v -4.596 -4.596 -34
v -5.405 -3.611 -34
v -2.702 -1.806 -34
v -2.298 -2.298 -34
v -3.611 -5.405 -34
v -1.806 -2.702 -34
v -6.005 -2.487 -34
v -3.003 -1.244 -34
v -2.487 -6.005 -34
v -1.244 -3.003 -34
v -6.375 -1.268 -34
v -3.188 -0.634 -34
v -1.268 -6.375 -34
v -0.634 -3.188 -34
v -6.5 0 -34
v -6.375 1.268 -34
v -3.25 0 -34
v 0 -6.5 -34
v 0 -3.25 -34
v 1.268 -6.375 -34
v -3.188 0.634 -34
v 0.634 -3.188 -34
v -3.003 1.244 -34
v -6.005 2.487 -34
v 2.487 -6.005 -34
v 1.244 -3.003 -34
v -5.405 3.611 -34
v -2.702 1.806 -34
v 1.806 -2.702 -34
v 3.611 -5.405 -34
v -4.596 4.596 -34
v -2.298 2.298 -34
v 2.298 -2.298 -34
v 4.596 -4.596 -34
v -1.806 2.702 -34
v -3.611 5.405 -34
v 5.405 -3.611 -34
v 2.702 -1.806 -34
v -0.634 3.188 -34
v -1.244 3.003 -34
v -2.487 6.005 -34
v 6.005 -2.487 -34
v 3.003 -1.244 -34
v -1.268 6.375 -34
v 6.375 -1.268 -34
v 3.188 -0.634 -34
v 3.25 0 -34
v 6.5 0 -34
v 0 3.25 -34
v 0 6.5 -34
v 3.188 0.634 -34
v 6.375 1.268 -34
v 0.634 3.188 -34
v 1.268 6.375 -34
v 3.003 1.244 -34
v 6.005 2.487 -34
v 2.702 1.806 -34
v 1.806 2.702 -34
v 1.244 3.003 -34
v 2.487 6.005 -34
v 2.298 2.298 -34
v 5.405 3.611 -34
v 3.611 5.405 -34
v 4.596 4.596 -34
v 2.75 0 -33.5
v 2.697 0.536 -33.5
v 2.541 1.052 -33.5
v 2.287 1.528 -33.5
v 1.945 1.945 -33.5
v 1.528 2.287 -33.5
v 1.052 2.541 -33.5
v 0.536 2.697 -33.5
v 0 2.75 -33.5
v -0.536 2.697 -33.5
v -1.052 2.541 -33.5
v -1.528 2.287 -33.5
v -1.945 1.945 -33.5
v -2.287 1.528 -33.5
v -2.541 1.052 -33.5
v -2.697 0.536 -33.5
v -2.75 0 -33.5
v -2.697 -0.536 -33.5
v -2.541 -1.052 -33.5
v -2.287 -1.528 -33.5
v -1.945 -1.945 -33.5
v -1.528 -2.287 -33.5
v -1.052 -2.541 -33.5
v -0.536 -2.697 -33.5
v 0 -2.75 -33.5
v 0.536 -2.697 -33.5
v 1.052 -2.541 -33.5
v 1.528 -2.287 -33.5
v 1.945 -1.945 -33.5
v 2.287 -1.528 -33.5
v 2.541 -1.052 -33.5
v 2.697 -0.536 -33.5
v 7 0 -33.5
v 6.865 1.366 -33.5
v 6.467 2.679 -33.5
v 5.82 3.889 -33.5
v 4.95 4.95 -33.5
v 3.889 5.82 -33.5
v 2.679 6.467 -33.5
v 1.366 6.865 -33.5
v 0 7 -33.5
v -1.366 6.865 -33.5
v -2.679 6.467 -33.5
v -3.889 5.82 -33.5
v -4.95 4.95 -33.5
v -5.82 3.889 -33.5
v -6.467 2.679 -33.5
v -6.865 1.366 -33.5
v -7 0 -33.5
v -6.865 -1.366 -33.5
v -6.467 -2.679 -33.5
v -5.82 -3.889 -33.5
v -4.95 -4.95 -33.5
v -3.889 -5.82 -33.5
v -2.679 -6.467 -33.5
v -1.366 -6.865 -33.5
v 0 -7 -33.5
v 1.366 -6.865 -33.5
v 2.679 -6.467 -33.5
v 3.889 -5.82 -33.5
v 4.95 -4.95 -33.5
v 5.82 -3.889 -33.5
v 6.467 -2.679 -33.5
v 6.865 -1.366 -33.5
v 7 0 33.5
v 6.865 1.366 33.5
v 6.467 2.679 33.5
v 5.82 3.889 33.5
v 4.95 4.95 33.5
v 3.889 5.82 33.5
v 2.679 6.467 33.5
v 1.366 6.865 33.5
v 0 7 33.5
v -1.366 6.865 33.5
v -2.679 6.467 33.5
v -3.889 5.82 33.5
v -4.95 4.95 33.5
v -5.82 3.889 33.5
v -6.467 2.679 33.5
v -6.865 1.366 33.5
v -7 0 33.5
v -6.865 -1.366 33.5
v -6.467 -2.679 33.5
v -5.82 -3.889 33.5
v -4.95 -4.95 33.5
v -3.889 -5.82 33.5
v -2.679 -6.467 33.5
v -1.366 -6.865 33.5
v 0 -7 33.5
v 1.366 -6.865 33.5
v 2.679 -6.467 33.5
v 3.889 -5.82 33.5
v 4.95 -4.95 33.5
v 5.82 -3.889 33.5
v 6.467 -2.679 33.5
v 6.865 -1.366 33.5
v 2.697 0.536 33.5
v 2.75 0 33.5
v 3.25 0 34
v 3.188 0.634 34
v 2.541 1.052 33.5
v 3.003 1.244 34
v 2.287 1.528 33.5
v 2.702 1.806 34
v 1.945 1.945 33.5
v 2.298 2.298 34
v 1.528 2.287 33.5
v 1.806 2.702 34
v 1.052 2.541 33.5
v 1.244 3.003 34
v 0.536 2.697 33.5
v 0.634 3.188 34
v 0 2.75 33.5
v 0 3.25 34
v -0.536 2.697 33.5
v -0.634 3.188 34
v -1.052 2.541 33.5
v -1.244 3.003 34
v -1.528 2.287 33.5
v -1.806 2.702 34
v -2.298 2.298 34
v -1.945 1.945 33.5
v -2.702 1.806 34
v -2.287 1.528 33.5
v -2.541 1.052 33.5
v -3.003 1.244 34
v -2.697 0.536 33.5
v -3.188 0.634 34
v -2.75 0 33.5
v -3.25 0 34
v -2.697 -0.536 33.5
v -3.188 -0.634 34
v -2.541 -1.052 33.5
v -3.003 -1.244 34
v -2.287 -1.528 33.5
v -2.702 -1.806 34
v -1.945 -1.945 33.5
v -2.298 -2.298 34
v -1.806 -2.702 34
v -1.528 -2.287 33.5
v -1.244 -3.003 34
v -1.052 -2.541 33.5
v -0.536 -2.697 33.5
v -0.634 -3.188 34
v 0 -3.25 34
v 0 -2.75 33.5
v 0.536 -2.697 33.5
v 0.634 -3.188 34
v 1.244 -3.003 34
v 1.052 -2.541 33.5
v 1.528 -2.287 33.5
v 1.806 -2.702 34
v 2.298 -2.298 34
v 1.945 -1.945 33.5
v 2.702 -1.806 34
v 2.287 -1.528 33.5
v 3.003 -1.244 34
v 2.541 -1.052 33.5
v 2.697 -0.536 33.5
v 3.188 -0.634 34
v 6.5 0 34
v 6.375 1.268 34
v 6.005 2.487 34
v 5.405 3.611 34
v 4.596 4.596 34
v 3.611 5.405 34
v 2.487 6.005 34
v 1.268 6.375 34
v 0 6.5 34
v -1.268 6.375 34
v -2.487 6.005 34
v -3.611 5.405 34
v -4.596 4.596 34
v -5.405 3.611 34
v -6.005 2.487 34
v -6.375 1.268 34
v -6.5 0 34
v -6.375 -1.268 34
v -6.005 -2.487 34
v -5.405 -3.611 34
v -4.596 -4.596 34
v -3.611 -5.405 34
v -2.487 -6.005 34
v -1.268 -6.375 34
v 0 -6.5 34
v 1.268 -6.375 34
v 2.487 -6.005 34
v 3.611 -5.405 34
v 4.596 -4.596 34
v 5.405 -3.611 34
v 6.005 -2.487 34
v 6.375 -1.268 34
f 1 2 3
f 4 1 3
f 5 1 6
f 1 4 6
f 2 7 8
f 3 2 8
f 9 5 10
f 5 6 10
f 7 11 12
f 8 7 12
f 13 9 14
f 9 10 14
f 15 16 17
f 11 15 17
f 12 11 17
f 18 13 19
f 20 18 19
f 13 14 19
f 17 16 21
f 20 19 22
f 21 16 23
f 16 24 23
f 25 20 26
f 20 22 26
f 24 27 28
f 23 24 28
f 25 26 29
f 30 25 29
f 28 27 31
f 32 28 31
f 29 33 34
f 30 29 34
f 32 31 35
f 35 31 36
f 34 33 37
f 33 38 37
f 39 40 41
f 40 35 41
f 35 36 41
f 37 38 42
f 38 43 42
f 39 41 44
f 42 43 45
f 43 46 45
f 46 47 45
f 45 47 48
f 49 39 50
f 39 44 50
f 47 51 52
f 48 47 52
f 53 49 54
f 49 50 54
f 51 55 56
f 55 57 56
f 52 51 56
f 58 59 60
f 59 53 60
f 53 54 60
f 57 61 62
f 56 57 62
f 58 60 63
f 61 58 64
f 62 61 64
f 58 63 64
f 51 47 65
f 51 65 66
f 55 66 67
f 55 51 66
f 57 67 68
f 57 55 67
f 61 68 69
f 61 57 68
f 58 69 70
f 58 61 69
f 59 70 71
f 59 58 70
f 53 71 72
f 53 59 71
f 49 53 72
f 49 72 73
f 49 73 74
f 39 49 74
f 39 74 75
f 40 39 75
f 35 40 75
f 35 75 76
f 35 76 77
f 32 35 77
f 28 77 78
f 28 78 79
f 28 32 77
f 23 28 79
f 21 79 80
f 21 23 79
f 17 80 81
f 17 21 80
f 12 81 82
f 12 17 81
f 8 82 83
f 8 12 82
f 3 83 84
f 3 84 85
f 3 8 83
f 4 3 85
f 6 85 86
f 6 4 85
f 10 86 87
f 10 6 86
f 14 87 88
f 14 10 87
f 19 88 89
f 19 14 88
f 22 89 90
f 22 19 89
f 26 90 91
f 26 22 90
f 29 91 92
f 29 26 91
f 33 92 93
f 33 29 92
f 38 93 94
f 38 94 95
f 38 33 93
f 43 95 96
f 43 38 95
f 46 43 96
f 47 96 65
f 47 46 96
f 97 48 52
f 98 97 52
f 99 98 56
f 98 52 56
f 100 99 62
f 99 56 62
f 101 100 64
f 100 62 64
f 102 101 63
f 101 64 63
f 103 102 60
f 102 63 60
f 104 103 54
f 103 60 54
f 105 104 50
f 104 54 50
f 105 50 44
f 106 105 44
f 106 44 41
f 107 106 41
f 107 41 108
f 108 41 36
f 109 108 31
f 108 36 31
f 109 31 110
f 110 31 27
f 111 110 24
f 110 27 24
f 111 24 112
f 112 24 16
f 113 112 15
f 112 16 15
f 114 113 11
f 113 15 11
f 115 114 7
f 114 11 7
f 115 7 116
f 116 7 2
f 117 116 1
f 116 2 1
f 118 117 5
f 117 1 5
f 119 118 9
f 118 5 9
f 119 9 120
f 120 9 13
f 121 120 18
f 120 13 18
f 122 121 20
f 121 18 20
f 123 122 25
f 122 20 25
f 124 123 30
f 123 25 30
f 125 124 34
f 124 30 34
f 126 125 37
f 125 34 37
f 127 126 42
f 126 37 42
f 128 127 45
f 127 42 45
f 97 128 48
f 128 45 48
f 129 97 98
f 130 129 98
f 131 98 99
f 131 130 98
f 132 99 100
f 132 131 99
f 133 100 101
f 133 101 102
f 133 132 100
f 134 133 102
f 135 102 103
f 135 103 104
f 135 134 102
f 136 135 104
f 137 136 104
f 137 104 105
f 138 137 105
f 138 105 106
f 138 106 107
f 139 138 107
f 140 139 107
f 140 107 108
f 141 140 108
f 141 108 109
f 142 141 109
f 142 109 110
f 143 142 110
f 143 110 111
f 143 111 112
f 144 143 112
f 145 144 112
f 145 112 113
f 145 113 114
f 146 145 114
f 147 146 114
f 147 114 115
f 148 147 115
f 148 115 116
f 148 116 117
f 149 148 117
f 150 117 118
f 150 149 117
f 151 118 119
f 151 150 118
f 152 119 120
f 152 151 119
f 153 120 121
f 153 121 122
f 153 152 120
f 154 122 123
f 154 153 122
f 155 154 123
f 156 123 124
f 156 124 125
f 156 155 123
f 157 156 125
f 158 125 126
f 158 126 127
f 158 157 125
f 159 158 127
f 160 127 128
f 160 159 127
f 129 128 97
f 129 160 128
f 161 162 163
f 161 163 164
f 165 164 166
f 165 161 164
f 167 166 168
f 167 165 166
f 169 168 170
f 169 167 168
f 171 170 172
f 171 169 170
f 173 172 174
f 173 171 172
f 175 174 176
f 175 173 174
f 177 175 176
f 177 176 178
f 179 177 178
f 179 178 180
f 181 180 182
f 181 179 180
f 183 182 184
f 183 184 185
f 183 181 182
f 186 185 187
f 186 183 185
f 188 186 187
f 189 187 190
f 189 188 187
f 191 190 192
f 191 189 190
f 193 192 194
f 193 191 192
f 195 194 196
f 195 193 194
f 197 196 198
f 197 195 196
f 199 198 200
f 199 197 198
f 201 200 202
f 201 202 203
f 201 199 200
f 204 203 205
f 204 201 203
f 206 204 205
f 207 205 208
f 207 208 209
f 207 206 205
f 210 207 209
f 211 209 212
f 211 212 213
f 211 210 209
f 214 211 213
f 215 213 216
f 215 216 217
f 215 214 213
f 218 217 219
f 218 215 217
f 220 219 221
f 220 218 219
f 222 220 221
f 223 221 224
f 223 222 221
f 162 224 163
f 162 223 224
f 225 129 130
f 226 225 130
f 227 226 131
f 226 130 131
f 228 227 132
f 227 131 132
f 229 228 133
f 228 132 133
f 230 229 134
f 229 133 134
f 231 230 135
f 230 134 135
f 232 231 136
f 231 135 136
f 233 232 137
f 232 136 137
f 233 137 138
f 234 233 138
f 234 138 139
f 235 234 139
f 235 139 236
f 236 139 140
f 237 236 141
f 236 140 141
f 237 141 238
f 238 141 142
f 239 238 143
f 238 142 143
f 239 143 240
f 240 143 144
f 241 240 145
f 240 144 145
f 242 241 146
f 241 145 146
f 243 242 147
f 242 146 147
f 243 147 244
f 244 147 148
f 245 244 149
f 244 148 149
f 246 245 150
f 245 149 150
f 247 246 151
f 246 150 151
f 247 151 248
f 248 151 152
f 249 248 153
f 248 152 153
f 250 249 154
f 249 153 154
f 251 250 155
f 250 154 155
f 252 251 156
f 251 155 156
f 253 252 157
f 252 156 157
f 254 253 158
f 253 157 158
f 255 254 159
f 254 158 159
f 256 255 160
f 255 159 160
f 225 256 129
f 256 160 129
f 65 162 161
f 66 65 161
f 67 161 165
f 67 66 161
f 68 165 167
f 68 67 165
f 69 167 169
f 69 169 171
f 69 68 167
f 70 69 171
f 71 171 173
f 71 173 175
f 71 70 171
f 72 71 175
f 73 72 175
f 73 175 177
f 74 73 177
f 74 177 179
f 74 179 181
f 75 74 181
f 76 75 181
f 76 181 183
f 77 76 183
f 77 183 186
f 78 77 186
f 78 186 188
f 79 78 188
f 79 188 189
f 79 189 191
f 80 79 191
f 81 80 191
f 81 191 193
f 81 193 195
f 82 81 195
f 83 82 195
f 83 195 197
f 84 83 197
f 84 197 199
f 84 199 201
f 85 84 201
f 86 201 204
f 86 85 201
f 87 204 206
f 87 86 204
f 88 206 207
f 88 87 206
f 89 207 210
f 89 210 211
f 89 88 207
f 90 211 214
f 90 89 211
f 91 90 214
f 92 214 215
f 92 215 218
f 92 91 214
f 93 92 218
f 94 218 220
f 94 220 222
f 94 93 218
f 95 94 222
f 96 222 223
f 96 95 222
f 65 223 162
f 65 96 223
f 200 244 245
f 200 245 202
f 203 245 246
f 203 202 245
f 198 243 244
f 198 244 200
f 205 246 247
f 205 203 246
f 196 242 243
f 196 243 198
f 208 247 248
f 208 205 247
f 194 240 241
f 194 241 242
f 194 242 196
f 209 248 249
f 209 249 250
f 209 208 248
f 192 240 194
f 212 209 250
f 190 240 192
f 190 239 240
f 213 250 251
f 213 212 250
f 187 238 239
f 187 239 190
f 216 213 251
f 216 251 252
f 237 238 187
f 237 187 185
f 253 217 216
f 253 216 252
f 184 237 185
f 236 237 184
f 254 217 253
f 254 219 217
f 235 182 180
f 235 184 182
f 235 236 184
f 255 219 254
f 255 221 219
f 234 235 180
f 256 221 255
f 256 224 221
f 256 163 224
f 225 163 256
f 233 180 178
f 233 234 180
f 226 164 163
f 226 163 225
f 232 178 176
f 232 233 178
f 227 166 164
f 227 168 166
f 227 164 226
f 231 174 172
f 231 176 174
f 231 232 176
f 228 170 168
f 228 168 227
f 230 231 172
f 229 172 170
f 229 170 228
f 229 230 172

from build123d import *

# Parameters (mm, degrees)
SKETCH1_R           = 7
SKETCH1_R_2         = 2.75
BOSS_EXTRUDE1_DEPTH = 34
CHAMFER1_SIZE       = 0.5
CHAMFER2_SIZE       = 0.5


with BuildPart() as part:
    # Sketch1 → Boss-Extrude1 (new, symmetric)
    with BuildSketch(Plane(origin=(0, 0, 0), x_dir=(0, 1, 0), z_dir=(0, 0, 1))):
        with Locations(Location((0, 0, 0), (0, 0, 270))):
            Circle(SKETCH1_R)
        with Locations(Location((0, 0, 0), (0, 0, 270))):
            Circle(SKETCH1_R_2, mode=Mode.SUBTRACT)
    extrude(amount=BOSS_EXTRUDE1_DEPTH, both=True)

    # Chamfer1
    chamfer1_edges = [part.edges().sort_by_distance(p)[0] for p in [
        (-2.75, 0, -34),
        (-2.75, 0, 34),
    ]]
    chamfer(chamfer1_edges, length=CHAMFER1_SIZE)

    # Chamfer2
    chamfer2_edges = [part.edges().sort_by_distance(p)[0] for p in [
        (-7, 0, -34),
        (-7, 0, 34),
    ]]
    chamfer(chamfer2_edges, length=CHAMFER2_SIZE)


solid = part.part
